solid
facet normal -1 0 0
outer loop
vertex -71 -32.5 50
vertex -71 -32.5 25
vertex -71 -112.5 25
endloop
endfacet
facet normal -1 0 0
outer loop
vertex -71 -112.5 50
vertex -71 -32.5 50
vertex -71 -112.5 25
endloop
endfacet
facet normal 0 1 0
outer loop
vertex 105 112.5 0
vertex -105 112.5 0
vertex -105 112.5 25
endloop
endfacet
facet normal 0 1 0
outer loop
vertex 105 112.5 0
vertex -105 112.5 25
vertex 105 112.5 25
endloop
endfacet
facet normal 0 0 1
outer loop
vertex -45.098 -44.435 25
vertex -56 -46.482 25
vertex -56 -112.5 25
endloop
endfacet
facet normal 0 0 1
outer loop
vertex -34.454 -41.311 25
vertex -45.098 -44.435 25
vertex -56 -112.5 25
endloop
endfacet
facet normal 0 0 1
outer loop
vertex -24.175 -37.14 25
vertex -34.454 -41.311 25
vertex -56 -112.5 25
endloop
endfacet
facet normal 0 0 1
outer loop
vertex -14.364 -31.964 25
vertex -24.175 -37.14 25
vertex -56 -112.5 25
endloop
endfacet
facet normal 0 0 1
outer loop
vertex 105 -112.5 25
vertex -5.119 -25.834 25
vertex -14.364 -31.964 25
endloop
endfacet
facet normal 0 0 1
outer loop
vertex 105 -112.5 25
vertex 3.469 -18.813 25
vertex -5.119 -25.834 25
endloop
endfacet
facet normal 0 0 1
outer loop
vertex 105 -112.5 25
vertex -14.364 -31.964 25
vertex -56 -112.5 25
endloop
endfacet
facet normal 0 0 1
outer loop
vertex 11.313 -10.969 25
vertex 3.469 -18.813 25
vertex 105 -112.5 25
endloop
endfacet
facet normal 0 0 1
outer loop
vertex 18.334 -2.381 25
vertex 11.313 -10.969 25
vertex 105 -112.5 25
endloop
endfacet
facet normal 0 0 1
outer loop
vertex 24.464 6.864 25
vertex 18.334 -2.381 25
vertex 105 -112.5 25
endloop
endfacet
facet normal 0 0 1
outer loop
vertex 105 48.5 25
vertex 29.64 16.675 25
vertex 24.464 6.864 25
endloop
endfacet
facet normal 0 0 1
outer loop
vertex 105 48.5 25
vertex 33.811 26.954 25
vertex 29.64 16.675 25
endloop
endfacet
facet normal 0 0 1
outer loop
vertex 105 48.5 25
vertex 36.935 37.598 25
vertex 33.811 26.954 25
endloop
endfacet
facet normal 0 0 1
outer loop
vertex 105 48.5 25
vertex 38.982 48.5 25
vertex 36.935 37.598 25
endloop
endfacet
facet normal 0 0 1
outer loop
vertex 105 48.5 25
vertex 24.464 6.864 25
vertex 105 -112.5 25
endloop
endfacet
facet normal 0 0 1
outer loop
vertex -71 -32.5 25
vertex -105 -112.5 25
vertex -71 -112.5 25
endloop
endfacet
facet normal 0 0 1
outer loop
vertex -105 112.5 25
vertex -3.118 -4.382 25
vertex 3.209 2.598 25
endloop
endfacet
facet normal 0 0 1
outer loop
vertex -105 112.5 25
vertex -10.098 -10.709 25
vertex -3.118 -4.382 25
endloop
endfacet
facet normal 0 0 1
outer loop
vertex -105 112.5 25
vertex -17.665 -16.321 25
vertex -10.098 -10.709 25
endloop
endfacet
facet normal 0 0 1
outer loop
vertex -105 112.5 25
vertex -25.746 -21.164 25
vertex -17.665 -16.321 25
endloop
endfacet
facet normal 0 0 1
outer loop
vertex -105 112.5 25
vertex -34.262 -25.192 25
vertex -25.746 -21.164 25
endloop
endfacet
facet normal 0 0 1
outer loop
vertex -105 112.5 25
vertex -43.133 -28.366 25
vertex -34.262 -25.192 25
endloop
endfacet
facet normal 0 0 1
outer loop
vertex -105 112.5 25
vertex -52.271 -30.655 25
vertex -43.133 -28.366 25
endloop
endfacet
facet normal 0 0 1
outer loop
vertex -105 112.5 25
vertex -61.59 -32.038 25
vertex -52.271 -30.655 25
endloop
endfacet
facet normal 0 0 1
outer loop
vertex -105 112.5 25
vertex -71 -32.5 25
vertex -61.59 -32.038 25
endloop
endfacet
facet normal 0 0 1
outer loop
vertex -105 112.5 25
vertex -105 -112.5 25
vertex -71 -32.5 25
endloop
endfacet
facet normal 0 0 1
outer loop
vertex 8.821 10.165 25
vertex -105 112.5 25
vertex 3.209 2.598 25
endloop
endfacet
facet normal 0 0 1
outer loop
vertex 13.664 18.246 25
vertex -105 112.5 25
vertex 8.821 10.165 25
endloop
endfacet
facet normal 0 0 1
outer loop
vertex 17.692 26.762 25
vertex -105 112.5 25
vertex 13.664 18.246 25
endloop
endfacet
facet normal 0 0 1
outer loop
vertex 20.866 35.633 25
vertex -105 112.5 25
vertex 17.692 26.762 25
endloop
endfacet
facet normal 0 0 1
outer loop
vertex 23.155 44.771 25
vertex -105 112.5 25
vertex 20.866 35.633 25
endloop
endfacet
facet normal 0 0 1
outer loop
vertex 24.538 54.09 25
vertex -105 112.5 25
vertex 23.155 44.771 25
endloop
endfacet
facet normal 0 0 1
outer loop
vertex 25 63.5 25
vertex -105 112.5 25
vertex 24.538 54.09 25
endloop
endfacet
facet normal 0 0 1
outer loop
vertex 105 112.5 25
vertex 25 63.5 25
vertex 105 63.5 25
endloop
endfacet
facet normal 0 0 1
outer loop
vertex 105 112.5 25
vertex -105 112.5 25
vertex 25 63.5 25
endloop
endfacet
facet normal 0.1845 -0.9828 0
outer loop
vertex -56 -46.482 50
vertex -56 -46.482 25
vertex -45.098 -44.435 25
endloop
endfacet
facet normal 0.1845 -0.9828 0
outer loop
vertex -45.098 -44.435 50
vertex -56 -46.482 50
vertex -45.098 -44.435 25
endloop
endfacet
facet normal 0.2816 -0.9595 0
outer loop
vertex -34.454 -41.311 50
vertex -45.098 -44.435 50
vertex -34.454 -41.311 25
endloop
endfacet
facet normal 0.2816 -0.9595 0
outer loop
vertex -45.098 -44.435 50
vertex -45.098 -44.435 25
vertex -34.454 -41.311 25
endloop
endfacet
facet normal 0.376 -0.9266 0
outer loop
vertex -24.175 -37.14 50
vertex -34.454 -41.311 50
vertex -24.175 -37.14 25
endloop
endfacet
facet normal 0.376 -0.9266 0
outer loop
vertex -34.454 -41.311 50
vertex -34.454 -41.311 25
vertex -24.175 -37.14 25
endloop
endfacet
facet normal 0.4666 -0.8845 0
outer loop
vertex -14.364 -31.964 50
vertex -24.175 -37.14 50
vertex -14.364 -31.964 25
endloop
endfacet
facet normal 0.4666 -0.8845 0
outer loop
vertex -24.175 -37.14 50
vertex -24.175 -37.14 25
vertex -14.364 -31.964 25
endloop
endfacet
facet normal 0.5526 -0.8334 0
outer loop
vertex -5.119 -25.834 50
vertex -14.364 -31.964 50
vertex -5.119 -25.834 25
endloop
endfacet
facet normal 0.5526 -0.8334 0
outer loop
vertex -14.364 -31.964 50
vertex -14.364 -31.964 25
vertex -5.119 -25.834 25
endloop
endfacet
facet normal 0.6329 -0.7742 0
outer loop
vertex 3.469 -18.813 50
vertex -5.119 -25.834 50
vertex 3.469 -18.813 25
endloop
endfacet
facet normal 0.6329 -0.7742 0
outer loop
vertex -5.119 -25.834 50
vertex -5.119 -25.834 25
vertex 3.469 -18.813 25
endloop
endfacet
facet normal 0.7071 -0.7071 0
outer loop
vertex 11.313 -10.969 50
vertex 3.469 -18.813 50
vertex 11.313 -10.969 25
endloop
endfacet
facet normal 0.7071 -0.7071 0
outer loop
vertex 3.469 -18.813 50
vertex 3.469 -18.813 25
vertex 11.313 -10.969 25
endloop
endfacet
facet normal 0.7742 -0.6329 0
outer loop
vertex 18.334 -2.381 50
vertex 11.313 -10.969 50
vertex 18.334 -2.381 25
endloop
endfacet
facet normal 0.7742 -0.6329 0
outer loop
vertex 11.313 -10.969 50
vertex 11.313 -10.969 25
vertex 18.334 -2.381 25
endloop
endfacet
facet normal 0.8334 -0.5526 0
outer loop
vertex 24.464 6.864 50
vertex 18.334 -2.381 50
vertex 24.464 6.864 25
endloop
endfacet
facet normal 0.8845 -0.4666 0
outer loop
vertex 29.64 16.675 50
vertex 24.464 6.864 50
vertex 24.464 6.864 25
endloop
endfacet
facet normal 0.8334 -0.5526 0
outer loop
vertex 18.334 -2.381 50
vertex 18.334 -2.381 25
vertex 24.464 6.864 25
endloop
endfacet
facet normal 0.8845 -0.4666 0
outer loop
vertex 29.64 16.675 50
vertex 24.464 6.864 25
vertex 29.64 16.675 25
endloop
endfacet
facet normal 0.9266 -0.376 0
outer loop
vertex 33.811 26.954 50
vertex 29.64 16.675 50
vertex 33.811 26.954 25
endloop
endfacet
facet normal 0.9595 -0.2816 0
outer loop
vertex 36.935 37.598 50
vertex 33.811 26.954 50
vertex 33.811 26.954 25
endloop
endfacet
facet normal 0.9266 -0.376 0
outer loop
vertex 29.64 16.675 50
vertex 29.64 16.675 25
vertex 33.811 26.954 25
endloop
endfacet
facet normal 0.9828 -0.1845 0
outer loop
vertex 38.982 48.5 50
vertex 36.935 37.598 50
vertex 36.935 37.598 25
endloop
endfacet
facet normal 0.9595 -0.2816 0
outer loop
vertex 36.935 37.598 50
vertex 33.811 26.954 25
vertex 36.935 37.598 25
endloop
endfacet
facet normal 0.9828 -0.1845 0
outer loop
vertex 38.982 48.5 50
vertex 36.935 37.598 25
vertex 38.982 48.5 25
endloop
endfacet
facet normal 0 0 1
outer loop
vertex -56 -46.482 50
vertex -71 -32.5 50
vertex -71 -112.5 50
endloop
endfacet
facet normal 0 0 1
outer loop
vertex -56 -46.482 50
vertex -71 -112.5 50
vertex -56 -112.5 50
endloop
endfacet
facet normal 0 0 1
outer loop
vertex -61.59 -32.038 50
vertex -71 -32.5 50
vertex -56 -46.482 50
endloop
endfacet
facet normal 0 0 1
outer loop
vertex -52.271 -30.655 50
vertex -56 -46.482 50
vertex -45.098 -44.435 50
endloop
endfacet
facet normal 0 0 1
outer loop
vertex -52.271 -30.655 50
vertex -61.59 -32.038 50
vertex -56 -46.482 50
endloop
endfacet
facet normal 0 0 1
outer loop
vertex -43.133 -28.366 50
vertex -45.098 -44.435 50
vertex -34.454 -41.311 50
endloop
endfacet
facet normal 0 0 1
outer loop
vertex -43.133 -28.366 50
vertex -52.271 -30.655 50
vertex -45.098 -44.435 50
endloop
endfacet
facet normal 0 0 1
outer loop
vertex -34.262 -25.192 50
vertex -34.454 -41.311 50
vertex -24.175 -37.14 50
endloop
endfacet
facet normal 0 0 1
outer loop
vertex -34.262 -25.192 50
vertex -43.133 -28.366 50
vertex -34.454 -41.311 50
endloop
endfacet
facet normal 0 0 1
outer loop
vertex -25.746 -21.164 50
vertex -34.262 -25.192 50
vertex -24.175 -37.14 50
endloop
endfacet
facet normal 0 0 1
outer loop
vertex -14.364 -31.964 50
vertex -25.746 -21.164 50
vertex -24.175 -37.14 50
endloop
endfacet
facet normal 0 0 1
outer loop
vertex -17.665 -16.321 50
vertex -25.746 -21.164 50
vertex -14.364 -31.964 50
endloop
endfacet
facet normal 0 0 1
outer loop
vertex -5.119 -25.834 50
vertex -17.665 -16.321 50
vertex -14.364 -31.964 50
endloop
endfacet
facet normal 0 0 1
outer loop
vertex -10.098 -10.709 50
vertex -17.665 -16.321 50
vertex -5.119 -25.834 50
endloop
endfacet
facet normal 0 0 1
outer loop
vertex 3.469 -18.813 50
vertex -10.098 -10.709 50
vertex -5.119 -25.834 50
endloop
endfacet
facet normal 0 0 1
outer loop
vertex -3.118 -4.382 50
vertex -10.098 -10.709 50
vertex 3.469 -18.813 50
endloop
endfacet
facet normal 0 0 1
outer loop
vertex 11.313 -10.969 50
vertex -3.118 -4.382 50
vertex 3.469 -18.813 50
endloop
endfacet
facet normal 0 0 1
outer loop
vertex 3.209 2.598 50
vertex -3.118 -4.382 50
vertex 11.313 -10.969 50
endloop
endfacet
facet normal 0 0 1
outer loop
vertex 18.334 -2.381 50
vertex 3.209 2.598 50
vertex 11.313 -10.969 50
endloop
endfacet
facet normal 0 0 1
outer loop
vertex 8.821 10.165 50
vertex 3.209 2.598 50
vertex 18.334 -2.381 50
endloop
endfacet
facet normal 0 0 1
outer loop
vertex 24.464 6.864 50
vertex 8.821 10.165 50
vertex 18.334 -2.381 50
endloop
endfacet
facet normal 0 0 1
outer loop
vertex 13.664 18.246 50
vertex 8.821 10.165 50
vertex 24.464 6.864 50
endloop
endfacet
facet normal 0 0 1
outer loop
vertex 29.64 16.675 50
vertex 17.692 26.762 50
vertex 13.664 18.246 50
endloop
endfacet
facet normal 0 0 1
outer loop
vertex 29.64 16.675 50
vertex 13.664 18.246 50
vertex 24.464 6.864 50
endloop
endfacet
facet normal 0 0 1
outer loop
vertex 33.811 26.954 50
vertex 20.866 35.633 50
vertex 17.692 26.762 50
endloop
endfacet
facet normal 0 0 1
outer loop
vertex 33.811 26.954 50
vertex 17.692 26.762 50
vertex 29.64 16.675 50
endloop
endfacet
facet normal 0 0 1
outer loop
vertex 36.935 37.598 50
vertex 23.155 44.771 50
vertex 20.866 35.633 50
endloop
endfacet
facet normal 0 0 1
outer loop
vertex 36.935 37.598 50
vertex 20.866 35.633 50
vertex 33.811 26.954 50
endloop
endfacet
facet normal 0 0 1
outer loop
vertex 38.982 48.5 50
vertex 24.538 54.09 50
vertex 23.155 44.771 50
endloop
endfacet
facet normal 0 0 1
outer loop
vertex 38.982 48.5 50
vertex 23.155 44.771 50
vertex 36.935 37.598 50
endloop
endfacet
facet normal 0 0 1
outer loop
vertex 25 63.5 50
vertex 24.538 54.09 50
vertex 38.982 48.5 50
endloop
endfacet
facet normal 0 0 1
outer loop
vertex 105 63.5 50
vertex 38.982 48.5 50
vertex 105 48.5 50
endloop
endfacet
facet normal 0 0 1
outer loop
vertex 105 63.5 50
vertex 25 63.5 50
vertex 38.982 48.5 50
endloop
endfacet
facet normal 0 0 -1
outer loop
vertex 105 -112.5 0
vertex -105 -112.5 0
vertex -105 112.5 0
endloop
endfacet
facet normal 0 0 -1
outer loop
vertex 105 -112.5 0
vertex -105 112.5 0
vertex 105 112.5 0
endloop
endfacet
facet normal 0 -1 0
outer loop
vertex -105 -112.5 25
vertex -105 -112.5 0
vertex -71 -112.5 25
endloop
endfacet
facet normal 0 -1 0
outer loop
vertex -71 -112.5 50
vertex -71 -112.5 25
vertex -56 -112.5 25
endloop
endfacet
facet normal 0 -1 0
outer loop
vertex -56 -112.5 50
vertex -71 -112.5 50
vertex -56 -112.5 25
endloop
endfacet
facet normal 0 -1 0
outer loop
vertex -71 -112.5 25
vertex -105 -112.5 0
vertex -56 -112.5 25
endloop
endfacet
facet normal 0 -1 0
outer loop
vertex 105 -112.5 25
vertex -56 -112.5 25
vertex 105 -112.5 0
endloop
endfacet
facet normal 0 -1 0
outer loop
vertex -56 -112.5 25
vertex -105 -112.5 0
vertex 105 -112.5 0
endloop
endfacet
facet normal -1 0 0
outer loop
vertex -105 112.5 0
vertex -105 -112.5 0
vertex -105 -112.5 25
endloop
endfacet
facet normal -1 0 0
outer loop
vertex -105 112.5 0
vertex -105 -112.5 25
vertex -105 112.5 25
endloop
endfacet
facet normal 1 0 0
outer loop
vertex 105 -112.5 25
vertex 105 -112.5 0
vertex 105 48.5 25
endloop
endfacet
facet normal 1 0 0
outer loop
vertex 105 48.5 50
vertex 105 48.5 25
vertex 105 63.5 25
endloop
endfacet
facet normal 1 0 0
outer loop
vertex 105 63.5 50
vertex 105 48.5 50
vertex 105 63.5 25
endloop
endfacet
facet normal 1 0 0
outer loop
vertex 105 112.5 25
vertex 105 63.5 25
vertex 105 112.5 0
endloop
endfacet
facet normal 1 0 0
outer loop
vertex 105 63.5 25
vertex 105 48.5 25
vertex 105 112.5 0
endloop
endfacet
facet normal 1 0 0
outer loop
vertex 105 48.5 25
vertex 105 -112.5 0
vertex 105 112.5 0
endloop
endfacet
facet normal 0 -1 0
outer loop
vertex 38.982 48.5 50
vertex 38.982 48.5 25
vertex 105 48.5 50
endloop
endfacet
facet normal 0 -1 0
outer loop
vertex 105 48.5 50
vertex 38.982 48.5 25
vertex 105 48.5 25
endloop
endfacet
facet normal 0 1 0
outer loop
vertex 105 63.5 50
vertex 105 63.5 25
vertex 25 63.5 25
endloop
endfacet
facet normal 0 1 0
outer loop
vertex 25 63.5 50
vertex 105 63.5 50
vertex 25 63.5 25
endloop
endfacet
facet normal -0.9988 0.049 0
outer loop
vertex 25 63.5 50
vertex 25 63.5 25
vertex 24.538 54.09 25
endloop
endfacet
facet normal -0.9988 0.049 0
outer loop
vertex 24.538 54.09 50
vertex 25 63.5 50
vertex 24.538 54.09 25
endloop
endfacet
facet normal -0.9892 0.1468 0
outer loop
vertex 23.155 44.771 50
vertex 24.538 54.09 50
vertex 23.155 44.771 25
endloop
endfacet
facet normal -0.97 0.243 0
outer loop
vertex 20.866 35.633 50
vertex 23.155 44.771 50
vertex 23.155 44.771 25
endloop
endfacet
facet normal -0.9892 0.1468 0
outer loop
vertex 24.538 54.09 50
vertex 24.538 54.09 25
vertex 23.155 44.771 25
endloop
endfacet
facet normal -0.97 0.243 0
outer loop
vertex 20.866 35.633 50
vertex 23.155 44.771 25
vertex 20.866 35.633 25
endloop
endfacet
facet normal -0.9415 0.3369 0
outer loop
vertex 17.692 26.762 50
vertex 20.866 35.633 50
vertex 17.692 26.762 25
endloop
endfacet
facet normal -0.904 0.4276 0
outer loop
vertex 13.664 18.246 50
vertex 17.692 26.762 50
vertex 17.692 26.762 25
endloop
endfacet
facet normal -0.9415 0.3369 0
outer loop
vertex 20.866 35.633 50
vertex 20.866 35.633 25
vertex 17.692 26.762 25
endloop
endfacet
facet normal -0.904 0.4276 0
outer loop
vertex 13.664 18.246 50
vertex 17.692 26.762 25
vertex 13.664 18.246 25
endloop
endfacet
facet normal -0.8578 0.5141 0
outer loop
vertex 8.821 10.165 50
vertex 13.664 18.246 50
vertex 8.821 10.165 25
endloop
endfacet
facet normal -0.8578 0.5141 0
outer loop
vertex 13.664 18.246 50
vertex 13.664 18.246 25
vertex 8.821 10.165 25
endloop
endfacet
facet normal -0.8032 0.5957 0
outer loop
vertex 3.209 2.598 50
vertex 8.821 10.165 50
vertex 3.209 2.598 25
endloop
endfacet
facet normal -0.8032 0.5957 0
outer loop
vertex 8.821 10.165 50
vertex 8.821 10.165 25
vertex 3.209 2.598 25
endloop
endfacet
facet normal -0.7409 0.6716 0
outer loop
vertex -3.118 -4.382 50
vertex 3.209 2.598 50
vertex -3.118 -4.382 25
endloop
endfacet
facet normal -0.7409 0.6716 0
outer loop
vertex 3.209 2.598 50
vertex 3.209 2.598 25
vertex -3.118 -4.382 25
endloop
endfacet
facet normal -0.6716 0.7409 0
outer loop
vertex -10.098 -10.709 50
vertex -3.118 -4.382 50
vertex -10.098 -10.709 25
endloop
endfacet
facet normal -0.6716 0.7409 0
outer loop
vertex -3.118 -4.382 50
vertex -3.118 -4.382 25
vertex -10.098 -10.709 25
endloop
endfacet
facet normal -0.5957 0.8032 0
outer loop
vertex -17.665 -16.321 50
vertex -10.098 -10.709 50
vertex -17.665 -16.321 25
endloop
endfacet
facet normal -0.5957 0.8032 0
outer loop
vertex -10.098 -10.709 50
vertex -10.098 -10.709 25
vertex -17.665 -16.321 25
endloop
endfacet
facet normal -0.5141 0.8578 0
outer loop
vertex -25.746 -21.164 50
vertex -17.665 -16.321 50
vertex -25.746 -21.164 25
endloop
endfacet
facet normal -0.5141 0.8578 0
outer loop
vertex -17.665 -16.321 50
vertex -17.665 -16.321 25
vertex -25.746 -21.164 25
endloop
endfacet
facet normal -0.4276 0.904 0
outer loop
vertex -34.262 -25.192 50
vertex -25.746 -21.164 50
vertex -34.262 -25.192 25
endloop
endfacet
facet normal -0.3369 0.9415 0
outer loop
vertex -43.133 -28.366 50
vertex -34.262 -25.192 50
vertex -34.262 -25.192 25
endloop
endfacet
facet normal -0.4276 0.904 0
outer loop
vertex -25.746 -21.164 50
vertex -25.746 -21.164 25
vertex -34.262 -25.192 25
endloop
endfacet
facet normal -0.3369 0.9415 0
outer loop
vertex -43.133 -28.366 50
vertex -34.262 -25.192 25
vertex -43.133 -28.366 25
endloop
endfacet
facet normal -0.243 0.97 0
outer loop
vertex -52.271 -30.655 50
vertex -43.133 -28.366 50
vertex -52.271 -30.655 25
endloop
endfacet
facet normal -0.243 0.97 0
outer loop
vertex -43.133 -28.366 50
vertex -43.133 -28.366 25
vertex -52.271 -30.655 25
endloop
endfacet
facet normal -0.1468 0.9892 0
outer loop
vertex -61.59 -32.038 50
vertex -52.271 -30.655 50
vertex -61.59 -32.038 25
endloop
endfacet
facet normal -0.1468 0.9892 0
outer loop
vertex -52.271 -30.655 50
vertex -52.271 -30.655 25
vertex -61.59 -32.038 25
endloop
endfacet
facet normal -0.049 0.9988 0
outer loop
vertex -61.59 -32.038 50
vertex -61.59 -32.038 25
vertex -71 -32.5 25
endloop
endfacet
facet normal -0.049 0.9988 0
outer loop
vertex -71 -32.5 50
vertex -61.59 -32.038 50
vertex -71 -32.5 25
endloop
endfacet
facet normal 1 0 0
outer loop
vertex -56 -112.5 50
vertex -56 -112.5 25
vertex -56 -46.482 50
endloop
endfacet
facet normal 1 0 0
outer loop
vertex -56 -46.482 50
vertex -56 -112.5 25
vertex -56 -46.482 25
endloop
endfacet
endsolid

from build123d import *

# Parameters (mm, degrees)
F0_W     = 210
F0_H     = 225
F1_DEPTH = 25
F3_DEPTH = 25


with BuildPart() as f1:
    # F0 (on Top) → F1 (new body)
    with BuildSketch(Plane.XY):
        Rectangle(F0_W, F0_H)
    extrude(amount=F1_DEPTH)

    # F2 (on face) → F3 (join)
    with BuildSketch(Plane.XY.offset(25)):
        with BuildLine():
            Line((-71, -32.5), (-71, -112.5))
            Line((-71, -112.5), (-56, -112.5))
            Line((-56, -112.5), (-56, -46.481817))
            ThreePointArc((-56, -46.481817), (7.488853, -14.988853), (38.981817, 48.5))
            Line((38.981817, 48.5), (105, 48.5))
            Line((105, 48.5), (105, 63.5))
            Line((105, 63.5), (25, 63.5))
            ThreePointArc((25, 63.5), (-3.117749, -4.382251), (-71, -32.5))
        make_face()
    extrude(amount=F3_DEPTH)


solid = f1.part
